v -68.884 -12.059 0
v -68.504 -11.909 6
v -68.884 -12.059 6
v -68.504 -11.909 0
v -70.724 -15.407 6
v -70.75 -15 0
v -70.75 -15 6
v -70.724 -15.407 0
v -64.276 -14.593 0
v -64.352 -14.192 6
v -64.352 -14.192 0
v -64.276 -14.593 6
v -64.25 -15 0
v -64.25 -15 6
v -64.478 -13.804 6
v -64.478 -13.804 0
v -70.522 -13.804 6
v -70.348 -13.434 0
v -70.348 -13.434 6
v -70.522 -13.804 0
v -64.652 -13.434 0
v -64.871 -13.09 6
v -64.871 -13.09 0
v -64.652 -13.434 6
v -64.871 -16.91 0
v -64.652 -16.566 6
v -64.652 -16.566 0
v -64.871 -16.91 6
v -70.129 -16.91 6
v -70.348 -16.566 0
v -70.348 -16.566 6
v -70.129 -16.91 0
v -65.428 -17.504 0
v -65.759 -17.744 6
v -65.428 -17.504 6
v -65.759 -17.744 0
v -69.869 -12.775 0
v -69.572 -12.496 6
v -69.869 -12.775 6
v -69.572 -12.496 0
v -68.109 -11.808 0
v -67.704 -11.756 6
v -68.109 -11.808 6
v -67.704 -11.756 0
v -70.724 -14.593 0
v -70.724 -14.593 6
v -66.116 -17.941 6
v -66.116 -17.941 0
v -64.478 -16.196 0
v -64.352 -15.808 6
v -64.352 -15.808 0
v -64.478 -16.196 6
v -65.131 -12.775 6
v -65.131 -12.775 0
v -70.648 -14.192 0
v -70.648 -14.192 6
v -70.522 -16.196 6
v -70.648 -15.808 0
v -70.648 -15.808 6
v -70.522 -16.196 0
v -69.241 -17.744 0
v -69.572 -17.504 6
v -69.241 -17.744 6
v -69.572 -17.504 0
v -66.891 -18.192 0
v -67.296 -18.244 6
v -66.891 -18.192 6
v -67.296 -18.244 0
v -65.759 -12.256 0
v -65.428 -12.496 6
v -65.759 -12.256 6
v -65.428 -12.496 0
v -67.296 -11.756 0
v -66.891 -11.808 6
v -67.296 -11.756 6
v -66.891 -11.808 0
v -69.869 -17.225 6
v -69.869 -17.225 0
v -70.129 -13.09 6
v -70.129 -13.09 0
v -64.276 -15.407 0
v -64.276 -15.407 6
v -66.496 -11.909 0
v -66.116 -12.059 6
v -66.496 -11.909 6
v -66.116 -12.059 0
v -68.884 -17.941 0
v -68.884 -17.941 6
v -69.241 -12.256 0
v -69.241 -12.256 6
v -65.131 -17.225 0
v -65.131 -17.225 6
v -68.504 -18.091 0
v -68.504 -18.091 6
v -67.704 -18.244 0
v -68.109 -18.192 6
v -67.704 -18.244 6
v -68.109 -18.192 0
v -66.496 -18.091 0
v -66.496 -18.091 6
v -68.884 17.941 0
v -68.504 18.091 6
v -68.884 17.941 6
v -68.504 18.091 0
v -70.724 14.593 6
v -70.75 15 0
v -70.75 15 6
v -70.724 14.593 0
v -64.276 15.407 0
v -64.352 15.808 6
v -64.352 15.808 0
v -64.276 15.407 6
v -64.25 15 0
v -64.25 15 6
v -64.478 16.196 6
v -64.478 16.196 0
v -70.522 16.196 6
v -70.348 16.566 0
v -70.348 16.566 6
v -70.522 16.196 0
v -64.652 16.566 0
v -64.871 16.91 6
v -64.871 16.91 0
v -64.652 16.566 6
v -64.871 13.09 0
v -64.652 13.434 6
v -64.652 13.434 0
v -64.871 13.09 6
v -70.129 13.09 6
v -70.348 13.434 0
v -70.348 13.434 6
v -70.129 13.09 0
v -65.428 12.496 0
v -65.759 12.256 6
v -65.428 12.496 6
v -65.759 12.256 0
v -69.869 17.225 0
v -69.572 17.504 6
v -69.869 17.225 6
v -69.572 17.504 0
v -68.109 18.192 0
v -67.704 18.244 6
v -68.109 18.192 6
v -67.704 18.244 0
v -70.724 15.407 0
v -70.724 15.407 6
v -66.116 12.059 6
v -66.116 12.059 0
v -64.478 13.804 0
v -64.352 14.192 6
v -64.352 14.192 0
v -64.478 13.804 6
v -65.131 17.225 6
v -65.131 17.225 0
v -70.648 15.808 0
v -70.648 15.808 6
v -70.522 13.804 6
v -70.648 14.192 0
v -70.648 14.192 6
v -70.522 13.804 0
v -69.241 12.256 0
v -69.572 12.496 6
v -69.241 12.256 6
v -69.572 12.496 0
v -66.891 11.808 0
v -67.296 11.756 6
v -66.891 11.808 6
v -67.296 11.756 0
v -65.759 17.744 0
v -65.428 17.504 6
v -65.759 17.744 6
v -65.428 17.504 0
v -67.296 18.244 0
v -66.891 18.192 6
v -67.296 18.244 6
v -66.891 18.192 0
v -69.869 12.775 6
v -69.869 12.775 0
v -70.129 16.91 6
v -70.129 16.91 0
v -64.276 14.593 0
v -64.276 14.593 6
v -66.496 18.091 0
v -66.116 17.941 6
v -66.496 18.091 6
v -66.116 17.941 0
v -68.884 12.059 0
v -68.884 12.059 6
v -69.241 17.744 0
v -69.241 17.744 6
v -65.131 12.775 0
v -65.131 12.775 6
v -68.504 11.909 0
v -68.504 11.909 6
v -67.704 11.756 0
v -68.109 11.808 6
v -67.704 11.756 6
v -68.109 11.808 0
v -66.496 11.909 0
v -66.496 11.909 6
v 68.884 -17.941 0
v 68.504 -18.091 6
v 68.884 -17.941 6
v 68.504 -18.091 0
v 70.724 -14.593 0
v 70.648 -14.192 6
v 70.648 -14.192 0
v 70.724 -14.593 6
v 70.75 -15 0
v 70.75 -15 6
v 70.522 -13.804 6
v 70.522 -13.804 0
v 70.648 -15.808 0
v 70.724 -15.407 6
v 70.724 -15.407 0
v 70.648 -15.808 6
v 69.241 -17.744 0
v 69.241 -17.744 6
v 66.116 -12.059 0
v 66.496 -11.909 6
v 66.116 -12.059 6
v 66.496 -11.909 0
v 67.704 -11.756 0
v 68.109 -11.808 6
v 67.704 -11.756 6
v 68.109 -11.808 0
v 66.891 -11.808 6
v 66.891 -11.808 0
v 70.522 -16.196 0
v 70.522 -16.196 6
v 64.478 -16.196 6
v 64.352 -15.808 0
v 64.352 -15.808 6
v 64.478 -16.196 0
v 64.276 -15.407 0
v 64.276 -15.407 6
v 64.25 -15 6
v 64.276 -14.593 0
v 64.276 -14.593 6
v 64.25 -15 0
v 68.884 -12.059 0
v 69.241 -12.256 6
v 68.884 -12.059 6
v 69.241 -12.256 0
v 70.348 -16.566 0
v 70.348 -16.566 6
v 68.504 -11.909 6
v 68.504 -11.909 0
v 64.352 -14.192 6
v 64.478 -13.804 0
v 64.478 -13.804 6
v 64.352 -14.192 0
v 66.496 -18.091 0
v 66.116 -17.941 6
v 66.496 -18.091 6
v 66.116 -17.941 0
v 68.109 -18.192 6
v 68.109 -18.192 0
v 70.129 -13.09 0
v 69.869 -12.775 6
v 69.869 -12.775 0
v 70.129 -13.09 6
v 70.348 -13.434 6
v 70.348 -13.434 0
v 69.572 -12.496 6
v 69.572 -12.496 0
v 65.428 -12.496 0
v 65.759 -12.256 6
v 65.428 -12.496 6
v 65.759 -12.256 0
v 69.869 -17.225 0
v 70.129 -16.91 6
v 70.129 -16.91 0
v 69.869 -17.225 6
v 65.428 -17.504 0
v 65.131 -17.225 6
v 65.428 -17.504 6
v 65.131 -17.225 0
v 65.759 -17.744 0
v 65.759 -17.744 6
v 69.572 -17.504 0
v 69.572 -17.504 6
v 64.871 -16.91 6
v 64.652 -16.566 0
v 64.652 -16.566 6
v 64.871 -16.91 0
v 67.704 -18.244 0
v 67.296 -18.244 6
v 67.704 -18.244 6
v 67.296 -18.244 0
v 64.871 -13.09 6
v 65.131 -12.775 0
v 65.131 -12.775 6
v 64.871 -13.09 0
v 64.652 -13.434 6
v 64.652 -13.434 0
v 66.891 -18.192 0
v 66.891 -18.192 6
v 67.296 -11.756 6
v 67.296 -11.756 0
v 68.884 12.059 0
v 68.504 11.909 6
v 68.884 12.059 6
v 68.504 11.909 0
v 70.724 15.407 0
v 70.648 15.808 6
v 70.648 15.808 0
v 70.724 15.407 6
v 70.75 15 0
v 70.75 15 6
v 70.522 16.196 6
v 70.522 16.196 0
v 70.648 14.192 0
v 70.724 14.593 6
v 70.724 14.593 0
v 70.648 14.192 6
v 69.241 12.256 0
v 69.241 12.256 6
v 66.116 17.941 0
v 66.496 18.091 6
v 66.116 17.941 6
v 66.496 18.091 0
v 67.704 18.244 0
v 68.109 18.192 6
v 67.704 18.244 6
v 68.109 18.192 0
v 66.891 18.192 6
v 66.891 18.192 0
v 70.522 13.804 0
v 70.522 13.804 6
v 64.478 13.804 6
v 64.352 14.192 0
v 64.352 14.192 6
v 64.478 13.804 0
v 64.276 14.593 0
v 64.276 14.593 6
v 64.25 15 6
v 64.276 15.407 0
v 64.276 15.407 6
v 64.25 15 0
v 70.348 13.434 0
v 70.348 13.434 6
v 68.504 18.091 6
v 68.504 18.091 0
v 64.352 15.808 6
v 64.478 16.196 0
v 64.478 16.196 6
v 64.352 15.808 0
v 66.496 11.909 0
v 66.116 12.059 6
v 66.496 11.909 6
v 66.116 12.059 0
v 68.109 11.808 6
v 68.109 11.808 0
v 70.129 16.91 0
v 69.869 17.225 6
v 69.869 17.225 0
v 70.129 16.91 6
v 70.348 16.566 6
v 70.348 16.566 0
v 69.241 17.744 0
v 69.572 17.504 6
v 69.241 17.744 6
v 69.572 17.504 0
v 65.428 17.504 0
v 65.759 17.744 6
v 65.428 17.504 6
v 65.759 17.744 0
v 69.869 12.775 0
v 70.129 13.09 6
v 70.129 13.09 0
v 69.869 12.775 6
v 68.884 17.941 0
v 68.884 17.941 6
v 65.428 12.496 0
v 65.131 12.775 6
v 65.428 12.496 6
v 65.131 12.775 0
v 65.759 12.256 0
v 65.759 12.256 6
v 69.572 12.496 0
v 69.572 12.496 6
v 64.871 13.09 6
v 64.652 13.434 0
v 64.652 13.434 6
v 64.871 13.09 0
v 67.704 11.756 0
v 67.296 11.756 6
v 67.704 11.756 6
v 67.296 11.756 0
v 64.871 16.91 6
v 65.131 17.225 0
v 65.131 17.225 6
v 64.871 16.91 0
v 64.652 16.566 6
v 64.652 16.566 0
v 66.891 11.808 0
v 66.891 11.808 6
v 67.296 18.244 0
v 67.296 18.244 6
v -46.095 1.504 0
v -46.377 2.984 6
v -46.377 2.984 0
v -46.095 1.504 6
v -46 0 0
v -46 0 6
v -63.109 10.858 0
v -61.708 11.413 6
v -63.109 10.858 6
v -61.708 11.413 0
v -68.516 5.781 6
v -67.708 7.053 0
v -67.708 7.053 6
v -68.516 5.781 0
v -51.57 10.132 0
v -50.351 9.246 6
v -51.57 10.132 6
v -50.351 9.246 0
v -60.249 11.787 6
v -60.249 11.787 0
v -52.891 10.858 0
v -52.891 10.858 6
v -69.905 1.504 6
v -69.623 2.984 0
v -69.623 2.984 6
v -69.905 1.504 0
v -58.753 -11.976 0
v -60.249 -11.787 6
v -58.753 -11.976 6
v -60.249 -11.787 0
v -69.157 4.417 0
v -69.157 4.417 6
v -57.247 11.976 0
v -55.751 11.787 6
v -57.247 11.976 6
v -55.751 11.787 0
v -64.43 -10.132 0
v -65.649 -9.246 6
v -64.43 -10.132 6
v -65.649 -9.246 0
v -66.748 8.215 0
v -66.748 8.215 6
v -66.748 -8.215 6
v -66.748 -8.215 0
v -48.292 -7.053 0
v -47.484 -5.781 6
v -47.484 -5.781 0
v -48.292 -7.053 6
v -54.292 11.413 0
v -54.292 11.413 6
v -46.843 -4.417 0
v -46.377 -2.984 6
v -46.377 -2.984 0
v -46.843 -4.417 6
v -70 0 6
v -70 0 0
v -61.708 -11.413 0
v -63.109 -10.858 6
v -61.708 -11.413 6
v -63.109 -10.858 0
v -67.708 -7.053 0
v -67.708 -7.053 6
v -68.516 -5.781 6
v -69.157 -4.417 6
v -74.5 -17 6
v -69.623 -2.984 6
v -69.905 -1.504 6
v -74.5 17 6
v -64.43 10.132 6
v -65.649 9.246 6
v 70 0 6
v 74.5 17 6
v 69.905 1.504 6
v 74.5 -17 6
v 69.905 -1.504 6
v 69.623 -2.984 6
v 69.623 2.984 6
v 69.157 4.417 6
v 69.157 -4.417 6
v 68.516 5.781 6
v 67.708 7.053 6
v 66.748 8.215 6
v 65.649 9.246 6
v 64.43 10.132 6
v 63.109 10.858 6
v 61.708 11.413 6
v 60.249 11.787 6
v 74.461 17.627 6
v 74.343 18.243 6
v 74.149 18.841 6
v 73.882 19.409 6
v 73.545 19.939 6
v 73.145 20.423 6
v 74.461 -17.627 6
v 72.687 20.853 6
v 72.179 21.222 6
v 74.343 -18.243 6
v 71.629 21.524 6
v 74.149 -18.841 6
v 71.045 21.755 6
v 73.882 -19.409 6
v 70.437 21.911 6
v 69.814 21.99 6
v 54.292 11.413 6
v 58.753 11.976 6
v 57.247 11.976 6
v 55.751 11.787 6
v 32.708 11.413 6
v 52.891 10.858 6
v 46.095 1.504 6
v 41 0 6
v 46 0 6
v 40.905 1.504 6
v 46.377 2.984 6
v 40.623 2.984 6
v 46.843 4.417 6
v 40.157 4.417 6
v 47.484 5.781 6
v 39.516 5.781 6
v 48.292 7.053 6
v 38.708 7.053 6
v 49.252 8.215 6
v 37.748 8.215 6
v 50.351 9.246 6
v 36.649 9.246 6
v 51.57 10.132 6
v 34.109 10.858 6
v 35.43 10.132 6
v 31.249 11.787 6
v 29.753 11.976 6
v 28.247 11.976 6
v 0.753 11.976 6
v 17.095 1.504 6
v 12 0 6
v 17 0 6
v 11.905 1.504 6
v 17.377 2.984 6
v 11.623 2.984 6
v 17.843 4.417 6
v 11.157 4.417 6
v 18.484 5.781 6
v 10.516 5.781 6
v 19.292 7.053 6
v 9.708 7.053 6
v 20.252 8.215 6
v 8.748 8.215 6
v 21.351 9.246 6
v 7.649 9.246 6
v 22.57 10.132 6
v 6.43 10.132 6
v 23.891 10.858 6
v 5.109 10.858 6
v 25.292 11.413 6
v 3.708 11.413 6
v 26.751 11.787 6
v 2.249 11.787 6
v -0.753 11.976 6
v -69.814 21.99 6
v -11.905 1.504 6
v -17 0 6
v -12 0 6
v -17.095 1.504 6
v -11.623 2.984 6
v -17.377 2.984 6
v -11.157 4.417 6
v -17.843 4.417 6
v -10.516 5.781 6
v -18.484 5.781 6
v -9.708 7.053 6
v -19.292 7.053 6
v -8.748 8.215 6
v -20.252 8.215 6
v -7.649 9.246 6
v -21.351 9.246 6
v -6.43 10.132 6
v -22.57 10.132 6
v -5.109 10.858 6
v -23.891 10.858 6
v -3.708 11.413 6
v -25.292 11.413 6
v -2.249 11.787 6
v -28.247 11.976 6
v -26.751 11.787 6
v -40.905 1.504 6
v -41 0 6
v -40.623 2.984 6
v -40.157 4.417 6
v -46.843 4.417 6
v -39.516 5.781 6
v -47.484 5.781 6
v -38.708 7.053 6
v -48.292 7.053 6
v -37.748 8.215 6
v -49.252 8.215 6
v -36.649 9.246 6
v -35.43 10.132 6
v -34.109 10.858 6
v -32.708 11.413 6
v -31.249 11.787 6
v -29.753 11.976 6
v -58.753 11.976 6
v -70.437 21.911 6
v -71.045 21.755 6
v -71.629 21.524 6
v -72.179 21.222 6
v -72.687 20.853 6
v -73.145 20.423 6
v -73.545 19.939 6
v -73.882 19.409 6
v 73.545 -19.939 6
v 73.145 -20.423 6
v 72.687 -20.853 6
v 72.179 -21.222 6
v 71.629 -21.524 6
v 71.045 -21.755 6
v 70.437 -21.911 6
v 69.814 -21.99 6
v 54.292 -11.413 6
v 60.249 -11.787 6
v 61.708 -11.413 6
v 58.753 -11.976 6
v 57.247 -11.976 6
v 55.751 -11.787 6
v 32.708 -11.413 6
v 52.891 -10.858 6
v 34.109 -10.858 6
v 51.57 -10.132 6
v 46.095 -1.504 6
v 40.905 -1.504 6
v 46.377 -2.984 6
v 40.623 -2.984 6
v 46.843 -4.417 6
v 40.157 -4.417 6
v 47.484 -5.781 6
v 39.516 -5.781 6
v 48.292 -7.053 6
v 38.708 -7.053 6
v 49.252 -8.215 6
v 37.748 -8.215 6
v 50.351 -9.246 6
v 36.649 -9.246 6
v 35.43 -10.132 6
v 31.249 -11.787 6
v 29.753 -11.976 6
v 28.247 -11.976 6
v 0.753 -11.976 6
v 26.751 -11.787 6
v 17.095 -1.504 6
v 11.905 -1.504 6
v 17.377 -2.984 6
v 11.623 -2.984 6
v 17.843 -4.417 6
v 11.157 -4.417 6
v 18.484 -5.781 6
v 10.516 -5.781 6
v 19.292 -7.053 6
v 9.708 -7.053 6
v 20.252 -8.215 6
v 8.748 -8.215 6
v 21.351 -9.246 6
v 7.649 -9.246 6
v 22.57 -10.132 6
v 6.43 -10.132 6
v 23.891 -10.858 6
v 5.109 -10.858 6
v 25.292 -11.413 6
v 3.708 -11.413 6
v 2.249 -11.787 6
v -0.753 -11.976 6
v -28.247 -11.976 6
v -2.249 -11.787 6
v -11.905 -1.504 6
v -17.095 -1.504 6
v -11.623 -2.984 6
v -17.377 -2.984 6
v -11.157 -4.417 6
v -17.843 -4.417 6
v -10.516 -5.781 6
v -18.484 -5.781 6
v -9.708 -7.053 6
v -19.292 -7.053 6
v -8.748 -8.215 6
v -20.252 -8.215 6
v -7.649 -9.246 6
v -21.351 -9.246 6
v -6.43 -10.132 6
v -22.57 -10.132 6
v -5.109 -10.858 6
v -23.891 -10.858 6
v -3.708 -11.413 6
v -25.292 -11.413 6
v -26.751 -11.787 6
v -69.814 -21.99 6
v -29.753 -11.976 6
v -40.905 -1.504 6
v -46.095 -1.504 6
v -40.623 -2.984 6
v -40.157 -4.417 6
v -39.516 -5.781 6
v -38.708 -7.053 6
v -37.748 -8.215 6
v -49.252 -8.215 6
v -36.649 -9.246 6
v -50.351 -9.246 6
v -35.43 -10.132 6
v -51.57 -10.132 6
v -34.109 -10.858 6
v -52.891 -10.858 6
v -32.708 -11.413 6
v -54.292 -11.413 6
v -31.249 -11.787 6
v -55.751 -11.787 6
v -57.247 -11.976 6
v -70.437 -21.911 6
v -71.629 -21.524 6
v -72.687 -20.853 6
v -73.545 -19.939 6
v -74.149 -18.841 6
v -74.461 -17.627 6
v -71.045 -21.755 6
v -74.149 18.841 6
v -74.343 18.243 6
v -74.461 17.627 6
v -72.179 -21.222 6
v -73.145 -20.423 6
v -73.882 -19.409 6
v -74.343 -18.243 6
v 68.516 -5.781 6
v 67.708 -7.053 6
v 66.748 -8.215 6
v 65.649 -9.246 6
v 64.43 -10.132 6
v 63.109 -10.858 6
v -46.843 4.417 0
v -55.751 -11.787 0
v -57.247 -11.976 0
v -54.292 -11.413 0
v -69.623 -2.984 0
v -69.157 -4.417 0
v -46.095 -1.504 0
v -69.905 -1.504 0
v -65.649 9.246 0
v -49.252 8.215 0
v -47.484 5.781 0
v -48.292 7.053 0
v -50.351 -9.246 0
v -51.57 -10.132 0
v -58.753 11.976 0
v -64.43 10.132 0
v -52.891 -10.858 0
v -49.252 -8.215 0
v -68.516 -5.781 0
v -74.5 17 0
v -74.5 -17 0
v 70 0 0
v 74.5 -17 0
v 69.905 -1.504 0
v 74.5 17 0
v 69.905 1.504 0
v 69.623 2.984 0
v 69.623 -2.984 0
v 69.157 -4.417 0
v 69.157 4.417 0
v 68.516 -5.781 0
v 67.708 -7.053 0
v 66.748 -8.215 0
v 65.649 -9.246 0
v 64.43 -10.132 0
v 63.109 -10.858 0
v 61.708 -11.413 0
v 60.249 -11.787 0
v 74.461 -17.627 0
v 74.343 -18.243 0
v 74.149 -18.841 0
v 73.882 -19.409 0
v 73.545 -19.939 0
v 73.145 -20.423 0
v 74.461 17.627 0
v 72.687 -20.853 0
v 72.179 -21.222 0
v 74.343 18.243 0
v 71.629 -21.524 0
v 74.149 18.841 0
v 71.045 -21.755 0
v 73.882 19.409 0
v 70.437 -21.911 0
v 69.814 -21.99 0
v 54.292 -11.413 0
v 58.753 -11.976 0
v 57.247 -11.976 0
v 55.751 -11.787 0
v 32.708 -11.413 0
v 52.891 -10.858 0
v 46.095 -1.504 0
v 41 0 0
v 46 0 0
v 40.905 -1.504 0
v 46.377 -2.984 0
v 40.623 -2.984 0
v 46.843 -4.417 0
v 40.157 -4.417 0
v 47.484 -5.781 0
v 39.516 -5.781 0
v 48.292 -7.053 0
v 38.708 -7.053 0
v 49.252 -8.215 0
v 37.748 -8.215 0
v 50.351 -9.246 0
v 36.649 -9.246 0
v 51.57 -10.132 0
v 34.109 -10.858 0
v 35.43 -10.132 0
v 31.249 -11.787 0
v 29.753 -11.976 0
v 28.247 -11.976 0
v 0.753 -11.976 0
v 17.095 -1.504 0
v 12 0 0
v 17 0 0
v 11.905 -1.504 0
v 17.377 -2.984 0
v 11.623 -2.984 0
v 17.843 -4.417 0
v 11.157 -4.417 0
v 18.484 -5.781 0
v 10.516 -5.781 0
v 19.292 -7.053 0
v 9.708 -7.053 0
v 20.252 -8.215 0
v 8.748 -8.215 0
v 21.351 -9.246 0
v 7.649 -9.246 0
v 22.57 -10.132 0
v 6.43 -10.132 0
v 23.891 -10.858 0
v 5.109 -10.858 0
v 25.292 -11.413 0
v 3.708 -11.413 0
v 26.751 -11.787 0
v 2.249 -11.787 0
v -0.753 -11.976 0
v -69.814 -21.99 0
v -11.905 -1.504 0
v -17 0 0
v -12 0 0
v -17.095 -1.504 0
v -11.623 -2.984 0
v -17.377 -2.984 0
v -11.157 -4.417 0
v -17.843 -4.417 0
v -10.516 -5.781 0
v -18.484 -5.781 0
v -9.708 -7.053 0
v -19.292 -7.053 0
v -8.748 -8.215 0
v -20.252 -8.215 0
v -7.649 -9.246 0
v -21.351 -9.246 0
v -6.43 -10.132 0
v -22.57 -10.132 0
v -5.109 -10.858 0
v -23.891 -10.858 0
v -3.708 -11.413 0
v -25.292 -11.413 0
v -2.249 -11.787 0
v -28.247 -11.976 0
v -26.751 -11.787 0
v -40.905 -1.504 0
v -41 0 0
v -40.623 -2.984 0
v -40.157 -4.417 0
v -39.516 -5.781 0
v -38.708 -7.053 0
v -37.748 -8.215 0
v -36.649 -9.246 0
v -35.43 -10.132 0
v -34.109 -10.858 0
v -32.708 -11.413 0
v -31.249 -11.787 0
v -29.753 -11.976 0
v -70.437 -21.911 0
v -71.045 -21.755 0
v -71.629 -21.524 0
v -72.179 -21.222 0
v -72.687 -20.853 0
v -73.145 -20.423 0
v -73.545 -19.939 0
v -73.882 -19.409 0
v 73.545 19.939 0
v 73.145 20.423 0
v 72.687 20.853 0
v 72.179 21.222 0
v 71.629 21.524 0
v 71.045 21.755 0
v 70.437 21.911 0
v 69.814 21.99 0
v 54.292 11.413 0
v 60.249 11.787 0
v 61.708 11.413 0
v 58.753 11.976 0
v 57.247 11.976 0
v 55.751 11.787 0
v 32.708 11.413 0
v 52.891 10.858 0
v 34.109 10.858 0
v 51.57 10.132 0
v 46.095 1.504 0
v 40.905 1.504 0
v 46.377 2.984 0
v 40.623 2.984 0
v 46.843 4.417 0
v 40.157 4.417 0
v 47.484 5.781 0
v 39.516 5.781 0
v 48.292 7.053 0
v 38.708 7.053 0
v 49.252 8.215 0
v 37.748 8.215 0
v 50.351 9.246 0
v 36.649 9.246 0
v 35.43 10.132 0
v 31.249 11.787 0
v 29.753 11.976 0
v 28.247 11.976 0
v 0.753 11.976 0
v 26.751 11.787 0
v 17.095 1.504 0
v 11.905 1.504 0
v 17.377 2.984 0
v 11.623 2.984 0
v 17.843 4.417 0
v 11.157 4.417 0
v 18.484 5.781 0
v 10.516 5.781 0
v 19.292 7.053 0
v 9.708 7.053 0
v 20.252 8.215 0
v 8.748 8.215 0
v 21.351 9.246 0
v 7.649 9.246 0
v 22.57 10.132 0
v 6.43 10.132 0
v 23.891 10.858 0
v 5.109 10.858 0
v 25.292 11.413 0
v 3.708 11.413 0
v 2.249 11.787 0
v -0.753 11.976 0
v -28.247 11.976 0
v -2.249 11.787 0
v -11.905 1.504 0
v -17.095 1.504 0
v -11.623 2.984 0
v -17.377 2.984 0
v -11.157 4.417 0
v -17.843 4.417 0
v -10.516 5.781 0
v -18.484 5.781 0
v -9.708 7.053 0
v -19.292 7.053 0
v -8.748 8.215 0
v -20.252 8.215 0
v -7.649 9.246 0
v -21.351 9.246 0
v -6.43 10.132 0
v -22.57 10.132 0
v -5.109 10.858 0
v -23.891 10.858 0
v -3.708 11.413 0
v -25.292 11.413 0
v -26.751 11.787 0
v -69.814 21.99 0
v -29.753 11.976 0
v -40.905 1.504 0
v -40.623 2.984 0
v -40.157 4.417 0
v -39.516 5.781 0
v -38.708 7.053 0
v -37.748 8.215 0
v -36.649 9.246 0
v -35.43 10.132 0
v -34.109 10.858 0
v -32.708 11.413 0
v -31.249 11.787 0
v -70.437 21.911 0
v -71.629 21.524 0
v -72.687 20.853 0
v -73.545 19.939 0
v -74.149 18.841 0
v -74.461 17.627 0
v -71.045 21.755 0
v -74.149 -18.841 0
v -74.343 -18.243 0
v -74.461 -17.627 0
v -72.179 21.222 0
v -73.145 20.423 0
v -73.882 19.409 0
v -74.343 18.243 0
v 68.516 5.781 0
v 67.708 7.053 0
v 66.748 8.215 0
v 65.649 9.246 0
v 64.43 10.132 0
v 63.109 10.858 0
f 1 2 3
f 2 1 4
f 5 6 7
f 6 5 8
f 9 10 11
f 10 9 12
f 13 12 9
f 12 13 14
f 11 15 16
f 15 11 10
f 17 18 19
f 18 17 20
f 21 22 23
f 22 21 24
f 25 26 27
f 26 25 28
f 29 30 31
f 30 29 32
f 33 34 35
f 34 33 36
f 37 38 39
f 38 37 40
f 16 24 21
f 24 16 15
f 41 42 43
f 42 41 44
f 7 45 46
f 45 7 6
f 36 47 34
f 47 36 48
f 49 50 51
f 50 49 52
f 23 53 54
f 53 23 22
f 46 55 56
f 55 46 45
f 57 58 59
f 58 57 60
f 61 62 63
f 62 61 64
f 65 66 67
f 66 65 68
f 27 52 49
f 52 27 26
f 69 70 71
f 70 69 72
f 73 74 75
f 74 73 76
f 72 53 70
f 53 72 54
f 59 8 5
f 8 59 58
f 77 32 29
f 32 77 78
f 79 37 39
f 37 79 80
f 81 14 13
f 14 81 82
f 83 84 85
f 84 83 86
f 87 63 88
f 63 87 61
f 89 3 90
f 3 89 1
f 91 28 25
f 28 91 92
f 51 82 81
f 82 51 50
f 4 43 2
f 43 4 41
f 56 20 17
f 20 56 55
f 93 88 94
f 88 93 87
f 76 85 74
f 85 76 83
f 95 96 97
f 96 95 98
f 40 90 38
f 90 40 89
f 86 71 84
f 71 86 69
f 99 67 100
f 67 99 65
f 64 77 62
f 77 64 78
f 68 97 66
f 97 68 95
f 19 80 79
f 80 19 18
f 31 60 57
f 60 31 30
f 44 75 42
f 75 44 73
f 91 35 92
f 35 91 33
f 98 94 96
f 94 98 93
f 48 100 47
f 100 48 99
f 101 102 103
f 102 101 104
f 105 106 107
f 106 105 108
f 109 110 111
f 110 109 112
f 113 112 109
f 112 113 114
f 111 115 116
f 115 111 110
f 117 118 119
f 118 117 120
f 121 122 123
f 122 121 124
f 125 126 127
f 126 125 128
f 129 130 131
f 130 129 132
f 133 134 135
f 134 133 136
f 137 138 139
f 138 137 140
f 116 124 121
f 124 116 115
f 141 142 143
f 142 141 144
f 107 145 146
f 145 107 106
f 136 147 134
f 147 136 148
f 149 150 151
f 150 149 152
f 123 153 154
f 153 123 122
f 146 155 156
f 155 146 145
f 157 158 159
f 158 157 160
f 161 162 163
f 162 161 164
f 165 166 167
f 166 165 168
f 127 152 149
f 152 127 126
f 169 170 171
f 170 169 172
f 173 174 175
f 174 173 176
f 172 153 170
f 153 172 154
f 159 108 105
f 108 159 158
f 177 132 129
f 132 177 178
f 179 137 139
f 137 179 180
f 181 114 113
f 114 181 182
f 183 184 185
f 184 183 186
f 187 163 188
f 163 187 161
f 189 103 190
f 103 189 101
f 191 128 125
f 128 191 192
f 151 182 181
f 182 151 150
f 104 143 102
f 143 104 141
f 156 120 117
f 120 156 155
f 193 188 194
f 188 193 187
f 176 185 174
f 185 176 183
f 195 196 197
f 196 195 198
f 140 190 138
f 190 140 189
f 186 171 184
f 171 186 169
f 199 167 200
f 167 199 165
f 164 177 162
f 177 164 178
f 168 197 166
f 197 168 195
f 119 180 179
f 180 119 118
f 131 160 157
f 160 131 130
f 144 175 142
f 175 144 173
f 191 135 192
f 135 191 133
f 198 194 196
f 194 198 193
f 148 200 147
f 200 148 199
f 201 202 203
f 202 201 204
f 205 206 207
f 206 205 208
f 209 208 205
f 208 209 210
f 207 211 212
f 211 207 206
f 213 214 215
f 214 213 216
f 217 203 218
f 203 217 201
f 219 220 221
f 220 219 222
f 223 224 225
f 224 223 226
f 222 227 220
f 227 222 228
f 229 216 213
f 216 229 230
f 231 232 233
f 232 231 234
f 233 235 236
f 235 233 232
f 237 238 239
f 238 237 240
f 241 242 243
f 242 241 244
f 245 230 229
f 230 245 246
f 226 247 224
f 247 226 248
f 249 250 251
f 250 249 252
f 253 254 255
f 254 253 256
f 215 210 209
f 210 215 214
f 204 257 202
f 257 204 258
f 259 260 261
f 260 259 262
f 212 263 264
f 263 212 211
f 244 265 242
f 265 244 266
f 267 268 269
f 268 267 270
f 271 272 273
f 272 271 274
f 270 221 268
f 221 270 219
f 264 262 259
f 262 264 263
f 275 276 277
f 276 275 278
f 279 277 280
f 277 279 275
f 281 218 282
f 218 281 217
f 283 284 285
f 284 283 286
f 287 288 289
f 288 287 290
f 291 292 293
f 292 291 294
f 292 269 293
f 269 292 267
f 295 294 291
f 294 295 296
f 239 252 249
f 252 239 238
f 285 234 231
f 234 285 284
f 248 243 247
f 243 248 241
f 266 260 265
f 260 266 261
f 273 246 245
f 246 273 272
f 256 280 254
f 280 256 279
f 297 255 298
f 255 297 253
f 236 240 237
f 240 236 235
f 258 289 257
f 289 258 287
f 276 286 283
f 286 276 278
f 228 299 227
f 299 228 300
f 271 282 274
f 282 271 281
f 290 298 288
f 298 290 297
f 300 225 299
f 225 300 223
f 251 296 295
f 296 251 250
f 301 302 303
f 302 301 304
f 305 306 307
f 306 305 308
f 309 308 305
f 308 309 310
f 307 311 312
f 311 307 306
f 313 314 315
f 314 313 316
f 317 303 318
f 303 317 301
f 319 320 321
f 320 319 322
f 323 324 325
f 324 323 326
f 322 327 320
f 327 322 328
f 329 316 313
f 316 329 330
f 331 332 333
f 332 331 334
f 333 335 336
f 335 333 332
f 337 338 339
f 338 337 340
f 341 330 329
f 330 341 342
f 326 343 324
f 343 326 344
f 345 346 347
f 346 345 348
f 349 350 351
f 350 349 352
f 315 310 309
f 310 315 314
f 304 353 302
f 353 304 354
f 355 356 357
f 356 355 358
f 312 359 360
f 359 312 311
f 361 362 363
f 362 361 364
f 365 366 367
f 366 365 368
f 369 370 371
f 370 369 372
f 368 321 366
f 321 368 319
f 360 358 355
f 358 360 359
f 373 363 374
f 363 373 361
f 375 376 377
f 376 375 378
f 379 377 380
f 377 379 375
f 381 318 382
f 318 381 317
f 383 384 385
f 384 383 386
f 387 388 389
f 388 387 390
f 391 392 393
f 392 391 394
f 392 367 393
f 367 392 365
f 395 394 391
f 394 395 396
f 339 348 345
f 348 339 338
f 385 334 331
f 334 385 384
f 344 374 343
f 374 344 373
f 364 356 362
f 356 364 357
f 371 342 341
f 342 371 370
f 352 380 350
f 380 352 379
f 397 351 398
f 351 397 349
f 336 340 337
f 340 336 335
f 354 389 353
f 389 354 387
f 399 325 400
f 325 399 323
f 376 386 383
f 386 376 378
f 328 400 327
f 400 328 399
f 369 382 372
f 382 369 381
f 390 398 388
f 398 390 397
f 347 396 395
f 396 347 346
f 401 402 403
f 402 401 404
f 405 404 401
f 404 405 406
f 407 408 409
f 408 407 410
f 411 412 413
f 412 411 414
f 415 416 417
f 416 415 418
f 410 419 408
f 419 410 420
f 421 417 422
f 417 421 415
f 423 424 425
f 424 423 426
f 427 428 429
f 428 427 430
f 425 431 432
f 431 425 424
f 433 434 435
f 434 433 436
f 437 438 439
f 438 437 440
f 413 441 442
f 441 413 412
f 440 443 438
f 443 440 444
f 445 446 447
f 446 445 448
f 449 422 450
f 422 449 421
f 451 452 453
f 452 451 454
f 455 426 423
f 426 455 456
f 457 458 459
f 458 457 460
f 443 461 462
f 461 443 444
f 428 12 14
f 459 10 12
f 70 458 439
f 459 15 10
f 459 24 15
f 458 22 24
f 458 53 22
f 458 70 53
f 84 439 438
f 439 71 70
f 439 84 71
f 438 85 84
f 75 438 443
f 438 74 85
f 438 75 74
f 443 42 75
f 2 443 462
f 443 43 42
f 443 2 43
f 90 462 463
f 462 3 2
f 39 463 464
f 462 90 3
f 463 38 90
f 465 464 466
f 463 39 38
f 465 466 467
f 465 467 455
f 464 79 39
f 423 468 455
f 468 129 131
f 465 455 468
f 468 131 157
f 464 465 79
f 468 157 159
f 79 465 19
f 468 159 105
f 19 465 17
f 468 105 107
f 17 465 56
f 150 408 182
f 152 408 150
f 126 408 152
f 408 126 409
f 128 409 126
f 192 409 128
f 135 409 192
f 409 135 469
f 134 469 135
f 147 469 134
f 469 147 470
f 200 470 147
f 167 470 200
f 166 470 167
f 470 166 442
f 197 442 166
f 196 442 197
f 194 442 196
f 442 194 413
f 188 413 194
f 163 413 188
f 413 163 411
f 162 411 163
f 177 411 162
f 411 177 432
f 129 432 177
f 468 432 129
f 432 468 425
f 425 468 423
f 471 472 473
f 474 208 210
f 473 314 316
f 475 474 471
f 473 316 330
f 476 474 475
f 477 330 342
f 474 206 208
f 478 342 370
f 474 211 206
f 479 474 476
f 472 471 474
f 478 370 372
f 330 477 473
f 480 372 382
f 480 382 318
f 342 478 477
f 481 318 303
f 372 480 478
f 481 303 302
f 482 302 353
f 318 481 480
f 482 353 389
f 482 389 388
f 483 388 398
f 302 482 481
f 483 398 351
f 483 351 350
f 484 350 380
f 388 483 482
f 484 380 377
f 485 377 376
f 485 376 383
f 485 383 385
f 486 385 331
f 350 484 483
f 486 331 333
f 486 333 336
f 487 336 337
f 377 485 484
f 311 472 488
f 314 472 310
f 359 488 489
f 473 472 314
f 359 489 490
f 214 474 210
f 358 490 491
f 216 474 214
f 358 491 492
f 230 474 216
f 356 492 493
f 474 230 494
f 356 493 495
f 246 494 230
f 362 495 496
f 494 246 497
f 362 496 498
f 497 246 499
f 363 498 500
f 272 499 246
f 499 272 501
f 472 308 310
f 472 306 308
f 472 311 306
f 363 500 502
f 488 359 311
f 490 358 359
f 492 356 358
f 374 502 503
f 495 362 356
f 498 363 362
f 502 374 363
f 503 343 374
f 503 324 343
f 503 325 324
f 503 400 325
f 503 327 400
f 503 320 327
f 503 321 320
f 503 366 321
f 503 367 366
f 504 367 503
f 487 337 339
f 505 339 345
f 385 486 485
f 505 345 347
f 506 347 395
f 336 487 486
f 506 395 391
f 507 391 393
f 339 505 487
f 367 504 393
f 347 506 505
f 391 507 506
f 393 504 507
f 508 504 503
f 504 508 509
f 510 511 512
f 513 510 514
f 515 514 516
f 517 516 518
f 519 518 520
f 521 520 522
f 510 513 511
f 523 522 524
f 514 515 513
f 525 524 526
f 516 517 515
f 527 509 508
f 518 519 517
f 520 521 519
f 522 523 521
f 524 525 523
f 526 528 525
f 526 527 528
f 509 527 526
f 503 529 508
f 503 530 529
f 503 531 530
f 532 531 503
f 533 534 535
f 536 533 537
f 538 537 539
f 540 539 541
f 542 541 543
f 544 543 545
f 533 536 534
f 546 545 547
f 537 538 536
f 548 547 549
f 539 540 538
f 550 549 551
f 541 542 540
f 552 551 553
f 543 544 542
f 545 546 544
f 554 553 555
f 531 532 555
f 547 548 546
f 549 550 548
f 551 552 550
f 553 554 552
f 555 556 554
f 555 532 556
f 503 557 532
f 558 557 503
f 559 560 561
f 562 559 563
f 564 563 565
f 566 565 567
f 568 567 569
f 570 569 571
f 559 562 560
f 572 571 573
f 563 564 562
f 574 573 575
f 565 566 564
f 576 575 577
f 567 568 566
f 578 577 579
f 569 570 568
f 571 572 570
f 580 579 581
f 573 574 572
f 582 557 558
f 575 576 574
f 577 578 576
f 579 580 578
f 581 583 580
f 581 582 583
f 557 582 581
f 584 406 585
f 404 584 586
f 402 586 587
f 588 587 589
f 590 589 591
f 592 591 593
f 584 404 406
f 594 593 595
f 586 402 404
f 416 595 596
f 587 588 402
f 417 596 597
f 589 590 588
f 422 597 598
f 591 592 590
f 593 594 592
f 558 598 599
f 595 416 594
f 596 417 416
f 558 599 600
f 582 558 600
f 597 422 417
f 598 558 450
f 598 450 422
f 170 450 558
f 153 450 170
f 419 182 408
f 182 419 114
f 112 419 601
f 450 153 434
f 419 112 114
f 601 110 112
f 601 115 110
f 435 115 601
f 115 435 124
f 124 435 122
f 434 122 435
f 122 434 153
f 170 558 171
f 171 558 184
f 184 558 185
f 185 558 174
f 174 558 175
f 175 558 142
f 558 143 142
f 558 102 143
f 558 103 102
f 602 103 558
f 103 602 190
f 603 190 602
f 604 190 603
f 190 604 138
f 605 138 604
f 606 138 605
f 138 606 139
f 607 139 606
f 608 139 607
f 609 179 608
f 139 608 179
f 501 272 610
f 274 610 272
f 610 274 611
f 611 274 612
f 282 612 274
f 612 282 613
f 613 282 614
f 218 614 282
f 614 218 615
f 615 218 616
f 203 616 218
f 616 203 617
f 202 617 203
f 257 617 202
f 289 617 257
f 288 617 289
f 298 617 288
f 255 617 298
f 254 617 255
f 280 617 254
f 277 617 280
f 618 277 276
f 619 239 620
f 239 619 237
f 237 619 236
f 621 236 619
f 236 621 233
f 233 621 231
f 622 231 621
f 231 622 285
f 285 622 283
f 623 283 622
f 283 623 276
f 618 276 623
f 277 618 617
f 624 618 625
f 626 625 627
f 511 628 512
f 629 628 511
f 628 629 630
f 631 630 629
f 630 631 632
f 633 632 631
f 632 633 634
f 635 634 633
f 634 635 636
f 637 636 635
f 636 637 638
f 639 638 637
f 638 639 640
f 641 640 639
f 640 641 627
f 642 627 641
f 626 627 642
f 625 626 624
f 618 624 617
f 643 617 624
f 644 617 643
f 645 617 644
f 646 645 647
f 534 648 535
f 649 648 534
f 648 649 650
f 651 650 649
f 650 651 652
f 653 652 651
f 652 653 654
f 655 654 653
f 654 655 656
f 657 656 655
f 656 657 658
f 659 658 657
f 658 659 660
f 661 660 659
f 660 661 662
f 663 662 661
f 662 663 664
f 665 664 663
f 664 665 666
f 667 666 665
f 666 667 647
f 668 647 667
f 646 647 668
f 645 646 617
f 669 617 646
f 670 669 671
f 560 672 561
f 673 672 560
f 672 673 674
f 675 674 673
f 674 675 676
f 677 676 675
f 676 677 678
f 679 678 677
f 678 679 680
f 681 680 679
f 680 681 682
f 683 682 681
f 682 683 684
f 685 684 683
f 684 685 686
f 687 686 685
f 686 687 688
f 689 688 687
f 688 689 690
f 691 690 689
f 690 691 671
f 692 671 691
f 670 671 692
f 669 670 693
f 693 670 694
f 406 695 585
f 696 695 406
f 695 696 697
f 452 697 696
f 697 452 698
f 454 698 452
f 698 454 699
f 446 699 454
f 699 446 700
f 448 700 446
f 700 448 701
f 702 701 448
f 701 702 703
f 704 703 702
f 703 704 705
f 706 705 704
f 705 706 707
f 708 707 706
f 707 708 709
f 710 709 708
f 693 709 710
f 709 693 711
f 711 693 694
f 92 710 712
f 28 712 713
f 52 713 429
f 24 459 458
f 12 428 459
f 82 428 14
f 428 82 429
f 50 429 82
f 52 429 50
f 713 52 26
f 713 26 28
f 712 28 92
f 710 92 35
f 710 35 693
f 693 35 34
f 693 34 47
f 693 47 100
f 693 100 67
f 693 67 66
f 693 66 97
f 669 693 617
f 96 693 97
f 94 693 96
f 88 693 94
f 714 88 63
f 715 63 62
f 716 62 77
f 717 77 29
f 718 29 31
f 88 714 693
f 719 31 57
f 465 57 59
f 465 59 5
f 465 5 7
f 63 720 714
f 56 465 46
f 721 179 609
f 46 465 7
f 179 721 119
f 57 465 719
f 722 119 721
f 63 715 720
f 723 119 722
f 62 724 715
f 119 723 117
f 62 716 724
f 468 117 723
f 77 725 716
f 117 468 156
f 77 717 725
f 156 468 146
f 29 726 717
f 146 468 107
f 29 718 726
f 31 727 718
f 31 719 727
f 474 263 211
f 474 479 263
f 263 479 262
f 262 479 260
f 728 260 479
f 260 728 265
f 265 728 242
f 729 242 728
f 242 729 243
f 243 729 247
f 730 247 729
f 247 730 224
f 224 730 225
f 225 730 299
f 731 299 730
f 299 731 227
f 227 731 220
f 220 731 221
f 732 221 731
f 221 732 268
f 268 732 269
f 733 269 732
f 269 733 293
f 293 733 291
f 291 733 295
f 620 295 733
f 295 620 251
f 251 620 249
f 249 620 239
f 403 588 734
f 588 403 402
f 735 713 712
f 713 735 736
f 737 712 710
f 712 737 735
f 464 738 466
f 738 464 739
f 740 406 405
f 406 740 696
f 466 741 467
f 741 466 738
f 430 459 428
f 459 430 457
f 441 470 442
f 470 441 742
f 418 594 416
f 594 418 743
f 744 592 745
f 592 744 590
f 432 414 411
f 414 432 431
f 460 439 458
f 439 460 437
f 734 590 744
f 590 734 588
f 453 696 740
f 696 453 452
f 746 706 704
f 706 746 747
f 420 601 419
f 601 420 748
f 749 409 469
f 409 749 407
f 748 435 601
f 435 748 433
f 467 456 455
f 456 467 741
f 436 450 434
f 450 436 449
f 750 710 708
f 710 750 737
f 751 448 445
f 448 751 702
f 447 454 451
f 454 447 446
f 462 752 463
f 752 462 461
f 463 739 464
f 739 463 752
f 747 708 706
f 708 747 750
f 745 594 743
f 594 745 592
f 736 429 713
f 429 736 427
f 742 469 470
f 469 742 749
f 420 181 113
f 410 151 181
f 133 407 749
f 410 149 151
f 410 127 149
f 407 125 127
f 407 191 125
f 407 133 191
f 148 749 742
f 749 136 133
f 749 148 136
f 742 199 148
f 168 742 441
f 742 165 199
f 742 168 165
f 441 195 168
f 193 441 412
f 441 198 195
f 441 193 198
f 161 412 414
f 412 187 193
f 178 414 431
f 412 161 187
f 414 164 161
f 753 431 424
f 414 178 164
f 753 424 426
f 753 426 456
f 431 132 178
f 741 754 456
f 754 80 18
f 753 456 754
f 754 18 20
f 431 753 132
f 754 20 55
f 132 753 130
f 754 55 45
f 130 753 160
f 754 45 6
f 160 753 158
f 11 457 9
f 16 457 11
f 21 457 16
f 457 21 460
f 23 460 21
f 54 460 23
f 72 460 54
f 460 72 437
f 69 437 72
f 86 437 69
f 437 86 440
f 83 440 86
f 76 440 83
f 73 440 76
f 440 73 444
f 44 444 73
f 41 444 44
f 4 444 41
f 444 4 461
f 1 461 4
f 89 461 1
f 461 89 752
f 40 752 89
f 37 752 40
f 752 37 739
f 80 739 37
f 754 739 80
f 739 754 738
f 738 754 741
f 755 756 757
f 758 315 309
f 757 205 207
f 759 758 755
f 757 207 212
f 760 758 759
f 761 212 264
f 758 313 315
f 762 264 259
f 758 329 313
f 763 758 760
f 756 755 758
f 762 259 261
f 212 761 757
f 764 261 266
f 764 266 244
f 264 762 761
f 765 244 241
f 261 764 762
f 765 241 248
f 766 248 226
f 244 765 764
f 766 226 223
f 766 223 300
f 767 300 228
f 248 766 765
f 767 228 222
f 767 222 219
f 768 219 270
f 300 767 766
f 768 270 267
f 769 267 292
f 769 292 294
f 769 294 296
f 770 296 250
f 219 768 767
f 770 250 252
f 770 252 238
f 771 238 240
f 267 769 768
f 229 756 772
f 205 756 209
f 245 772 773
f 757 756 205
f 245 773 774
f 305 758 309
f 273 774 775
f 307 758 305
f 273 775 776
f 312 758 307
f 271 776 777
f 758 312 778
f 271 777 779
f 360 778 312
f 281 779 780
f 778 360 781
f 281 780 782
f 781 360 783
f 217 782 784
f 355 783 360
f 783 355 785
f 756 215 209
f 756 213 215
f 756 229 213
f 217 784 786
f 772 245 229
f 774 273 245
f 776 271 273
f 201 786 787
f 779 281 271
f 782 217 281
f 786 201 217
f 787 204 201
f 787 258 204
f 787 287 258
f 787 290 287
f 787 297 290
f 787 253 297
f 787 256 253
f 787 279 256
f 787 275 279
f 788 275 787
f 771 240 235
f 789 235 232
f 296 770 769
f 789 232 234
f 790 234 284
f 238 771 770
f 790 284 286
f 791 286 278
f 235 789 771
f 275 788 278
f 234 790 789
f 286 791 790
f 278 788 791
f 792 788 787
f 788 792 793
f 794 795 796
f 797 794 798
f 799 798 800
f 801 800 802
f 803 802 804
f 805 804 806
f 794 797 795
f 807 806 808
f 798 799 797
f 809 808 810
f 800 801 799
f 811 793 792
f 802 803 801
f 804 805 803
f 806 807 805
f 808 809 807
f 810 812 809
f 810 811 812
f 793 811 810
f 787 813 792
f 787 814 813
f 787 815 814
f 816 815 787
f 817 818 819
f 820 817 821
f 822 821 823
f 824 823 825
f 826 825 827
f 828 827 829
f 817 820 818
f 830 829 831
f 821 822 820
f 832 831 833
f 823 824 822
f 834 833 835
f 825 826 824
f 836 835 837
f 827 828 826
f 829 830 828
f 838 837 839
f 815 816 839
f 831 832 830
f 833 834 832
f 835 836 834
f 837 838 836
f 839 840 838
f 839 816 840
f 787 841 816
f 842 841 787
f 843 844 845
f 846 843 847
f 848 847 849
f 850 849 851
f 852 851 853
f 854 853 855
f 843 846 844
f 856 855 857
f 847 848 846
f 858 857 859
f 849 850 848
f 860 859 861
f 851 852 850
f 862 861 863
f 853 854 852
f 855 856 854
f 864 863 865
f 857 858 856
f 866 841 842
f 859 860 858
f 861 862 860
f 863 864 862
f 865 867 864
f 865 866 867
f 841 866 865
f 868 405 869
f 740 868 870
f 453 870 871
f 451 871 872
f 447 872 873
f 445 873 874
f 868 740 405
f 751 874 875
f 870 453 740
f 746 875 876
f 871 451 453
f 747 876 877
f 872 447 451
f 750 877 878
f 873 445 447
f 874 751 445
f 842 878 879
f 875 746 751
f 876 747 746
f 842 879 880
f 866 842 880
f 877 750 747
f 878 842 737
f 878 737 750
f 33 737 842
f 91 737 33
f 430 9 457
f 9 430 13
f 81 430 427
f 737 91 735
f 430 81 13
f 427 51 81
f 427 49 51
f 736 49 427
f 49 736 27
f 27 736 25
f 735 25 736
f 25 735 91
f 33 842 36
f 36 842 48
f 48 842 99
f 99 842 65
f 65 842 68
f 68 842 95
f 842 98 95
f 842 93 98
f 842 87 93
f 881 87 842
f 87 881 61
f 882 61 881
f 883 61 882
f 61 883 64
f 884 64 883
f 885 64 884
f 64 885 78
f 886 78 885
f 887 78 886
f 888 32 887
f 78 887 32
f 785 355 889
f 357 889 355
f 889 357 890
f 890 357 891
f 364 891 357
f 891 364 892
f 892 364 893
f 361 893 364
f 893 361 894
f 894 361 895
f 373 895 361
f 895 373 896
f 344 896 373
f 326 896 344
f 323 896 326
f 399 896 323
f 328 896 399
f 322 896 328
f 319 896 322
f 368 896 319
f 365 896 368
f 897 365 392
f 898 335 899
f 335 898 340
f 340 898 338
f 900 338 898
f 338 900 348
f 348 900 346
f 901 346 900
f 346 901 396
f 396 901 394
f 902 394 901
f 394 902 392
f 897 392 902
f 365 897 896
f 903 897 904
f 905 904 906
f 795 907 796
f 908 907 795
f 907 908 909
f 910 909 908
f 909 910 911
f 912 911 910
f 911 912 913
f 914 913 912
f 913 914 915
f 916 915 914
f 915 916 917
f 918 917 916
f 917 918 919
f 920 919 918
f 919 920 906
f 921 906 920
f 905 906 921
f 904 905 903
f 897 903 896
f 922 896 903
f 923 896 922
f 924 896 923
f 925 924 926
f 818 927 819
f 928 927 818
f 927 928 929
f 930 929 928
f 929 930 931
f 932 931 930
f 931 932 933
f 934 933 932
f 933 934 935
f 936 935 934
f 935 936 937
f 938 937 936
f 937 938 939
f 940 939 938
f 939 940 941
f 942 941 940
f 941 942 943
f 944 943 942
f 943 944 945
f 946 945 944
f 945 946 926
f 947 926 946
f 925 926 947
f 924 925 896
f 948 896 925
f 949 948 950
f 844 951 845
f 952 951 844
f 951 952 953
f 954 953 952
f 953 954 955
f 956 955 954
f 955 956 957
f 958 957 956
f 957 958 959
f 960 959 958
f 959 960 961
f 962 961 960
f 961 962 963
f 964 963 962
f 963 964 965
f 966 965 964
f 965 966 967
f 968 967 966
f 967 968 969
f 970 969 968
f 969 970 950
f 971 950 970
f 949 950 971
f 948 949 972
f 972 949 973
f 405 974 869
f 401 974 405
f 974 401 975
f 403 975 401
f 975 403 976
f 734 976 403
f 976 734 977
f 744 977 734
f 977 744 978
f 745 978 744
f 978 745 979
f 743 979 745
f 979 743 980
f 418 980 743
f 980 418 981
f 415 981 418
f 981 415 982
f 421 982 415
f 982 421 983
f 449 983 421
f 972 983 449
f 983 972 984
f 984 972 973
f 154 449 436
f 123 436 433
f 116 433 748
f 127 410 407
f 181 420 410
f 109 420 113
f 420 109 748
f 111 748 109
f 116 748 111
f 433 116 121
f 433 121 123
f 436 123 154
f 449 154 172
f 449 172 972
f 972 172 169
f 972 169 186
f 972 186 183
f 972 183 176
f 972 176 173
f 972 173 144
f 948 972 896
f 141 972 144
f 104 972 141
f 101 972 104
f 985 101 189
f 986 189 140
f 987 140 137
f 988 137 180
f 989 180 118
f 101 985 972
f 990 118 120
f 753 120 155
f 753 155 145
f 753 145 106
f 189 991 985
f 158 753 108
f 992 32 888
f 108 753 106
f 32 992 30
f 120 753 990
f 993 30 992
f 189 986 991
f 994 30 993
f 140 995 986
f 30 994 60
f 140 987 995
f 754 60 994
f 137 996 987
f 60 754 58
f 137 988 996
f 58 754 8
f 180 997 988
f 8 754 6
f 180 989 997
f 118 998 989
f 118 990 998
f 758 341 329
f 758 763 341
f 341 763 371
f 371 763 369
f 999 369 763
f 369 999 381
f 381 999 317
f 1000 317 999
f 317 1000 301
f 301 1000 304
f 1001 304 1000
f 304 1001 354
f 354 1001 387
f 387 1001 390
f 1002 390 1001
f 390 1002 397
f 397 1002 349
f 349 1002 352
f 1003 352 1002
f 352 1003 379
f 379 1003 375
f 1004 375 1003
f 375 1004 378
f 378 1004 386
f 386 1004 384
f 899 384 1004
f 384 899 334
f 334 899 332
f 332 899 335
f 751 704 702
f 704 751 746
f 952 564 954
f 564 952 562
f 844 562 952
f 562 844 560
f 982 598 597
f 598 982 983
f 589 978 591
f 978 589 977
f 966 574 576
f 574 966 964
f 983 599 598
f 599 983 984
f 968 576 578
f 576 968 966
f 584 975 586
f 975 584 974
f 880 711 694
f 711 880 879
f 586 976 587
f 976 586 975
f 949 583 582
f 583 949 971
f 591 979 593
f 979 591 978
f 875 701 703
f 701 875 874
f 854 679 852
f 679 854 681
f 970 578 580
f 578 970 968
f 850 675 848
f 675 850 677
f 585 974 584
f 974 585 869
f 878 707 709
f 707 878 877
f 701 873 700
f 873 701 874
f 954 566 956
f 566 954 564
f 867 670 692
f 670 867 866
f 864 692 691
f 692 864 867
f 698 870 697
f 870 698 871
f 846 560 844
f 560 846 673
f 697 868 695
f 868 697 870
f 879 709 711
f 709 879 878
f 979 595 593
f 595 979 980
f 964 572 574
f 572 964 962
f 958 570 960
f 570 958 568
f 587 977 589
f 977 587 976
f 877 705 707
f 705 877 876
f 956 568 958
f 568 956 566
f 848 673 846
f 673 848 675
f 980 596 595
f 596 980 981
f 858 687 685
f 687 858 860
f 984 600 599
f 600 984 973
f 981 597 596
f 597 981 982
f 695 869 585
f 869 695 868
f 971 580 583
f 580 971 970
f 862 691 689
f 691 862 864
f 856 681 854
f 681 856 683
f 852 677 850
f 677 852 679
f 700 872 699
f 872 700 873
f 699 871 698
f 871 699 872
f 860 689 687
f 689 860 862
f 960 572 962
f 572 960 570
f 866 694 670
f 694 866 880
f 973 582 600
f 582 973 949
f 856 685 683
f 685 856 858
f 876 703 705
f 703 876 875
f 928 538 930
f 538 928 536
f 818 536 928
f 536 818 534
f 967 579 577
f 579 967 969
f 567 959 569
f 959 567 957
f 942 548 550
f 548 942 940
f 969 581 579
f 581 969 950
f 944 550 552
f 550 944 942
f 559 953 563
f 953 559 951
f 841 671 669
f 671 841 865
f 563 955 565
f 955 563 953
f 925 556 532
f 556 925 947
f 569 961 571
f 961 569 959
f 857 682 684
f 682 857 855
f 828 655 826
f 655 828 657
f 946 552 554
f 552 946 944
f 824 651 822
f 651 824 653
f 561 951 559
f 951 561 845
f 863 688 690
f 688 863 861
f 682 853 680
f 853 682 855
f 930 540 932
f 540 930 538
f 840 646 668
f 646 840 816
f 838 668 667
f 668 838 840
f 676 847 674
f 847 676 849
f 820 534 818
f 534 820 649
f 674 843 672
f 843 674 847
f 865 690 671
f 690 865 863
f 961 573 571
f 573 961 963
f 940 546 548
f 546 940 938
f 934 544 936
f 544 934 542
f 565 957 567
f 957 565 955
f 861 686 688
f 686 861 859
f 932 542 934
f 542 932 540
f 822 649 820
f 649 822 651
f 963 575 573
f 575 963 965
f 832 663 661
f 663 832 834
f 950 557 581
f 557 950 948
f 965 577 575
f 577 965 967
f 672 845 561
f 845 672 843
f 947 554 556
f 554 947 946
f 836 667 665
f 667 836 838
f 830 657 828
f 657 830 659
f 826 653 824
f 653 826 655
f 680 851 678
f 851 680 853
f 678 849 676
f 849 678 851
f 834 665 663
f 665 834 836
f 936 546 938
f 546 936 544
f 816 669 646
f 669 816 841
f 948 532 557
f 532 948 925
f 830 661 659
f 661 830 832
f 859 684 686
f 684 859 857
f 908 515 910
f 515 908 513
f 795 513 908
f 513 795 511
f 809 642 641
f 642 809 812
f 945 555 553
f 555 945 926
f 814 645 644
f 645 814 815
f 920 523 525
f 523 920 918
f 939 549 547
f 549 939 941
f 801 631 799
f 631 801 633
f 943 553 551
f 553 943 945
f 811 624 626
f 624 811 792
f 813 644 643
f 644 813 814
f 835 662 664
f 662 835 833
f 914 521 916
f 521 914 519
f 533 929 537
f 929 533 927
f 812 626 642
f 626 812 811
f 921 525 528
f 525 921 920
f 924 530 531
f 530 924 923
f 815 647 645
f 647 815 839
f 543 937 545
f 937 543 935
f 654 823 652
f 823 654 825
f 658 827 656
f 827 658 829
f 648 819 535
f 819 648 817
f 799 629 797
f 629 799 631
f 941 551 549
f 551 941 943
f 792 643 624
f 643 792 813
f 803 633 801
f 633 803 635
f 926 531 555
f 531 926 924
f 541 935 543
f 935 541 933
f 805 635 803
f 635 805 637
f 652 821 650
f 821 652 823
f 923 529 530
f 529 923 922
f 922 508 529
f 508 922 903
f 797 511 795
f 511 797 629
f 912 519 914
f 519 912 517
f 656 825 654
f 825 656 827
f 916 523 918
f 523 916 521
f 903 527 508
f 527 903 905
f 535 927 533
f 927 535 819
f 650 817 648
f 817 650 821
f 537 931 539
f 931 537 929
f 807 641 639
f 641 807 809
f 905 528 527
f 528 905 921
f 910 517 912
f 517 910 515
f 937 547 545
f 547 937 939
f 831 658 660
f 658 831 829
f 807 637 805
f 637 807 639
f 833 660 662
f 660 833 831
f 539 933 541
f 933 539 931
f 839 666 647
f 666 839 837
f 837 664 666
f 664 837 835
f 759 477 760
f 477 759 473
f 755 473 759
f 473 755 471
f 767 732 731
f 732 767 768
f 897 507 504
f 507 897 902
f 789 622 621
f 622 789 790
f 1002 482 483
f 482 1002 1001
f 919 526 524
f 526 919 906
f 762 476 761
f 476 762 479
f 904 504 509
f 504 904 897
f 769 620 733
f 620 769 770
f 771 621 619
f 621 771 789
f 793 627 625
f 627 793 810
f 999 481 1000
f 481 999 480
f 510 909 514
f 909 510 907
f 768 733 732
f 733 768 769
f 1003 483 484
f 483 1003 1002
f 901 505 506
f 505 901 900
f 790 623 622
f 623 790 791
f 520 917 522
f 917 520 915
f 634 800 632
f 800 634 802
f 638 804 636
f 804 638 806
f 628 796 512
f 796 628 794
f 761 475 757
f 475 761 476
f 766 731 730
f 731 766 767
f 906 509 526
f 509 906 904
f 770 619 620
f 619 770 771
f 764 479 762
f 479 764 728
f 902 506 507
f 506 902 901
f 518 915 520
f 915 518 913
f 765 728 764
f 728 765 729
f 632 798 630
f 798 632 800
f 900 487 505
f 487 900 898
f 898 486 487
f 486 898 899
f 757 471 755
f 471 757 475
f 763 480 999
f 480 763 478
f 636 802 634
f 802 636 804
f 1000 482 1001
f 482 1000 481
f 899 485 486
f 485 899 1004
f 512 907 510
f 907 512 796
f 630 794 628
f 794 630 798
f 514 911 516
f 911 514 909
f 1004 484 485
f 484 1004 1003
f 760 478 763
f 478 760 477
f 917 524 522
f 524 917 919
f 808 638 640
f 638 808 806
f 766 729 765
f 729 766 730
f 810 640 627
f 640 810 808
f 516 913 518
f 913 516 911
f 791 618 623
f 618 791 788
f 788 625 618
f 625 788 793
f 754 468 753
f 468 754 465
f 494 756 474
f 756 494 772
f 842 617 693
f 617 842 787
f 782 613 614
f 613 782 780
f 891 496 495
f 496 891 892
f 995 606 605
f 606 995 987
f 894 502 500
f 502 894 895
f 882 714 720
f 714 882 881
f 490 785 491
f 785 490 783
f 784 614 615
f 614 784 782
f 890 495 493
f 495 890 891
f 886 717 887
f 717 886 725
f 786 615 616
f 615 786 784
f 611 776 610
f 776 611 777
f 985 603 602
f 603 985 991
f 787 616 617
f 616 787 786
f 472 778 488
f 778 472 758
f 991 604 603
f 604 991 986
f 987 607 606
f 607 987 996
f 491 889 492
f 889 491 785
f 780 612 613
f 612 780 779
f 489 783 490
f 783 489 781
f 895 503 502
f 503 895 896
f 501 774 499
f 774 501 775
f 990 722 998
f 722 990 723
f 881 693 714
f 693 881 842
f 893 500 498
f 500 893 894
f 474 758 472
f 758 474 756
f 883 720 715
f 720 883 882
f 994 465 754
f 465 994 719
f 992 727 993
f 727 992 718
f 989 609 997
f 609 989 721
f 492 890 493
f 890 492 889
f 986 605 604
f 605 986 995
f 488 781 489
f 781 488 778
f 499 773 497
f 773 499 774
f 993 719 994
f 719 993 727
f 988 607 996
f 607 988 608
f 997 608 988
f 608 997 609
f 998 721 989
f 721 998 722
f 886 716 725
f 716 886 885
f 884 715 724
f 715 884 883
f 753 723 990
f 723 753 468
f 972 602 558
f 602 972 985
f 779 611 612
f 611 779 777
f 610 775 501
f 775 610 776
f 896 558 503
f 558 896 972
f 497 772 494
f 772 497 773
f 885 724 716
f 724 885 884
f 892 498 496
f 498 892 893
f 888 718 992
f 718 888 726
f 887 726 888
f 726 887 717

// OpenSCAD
$fn = 50;


difference() {
	union() {
		hull() {
			translate(v = [-69.5000000000, 17.0000000000, 0]) {
				cylinder(h = 6, r = 5);
			}
			translate(v = [69.5000000000, 17.0000000000, 0]) {
				cylinder(h = 6, r = 5);
			}
			translate(v = [-69.5000000000, -17.0000000000, 0]) {
				cylinder(h = 6, r = 5);
			}
			translate(v = [69.5000000000, -17.0000000000, 0]) {
				cylinder(h = 6, r = 5);
			}
		}
	}
	union() {
		#translate(v = [-67.5000000000, -15.0000000000, -100.0000000000]) {
			cylinder(h = 200, r = 3.2500000000);
		}
		#translate(v = [-67.5000000000, 15.0000000000, -100.0000000000]) {
			cylinder(h = 200, r = 3.2500000000);
		}
		#translate(v = [67.5000000000, -15.0000000000, -100.0000000000]) {
			cylinder(h = 200, r = 3.2500000000);
		}
		#translate(v = [67.5000000000, 15.0000000000, -100.0000000000]) {
			cylinder(h = 200, r = 3.2500000000);
		}
		#translate(v = [-58.0000000000, 0, 0]) {
			cylinder(h = 6, r = 12.0000000000);
		}
		#translate(v = [-29.0000000000, 0, 0]) {
			cylinder(h = 6, r = 12.0000000000);
		}
		#cylinder(h = 6, r = 12.0000000000);
		#translate(v = [29.0000000000, 0, 0]) {
			cylinder(h = 6, r = 12.0000000000);
		}
		#translate(v = [58.0000000000, 0, 0]) {
			cylinder(h = 6, r = 12.0000000000);
		}
	}
}
